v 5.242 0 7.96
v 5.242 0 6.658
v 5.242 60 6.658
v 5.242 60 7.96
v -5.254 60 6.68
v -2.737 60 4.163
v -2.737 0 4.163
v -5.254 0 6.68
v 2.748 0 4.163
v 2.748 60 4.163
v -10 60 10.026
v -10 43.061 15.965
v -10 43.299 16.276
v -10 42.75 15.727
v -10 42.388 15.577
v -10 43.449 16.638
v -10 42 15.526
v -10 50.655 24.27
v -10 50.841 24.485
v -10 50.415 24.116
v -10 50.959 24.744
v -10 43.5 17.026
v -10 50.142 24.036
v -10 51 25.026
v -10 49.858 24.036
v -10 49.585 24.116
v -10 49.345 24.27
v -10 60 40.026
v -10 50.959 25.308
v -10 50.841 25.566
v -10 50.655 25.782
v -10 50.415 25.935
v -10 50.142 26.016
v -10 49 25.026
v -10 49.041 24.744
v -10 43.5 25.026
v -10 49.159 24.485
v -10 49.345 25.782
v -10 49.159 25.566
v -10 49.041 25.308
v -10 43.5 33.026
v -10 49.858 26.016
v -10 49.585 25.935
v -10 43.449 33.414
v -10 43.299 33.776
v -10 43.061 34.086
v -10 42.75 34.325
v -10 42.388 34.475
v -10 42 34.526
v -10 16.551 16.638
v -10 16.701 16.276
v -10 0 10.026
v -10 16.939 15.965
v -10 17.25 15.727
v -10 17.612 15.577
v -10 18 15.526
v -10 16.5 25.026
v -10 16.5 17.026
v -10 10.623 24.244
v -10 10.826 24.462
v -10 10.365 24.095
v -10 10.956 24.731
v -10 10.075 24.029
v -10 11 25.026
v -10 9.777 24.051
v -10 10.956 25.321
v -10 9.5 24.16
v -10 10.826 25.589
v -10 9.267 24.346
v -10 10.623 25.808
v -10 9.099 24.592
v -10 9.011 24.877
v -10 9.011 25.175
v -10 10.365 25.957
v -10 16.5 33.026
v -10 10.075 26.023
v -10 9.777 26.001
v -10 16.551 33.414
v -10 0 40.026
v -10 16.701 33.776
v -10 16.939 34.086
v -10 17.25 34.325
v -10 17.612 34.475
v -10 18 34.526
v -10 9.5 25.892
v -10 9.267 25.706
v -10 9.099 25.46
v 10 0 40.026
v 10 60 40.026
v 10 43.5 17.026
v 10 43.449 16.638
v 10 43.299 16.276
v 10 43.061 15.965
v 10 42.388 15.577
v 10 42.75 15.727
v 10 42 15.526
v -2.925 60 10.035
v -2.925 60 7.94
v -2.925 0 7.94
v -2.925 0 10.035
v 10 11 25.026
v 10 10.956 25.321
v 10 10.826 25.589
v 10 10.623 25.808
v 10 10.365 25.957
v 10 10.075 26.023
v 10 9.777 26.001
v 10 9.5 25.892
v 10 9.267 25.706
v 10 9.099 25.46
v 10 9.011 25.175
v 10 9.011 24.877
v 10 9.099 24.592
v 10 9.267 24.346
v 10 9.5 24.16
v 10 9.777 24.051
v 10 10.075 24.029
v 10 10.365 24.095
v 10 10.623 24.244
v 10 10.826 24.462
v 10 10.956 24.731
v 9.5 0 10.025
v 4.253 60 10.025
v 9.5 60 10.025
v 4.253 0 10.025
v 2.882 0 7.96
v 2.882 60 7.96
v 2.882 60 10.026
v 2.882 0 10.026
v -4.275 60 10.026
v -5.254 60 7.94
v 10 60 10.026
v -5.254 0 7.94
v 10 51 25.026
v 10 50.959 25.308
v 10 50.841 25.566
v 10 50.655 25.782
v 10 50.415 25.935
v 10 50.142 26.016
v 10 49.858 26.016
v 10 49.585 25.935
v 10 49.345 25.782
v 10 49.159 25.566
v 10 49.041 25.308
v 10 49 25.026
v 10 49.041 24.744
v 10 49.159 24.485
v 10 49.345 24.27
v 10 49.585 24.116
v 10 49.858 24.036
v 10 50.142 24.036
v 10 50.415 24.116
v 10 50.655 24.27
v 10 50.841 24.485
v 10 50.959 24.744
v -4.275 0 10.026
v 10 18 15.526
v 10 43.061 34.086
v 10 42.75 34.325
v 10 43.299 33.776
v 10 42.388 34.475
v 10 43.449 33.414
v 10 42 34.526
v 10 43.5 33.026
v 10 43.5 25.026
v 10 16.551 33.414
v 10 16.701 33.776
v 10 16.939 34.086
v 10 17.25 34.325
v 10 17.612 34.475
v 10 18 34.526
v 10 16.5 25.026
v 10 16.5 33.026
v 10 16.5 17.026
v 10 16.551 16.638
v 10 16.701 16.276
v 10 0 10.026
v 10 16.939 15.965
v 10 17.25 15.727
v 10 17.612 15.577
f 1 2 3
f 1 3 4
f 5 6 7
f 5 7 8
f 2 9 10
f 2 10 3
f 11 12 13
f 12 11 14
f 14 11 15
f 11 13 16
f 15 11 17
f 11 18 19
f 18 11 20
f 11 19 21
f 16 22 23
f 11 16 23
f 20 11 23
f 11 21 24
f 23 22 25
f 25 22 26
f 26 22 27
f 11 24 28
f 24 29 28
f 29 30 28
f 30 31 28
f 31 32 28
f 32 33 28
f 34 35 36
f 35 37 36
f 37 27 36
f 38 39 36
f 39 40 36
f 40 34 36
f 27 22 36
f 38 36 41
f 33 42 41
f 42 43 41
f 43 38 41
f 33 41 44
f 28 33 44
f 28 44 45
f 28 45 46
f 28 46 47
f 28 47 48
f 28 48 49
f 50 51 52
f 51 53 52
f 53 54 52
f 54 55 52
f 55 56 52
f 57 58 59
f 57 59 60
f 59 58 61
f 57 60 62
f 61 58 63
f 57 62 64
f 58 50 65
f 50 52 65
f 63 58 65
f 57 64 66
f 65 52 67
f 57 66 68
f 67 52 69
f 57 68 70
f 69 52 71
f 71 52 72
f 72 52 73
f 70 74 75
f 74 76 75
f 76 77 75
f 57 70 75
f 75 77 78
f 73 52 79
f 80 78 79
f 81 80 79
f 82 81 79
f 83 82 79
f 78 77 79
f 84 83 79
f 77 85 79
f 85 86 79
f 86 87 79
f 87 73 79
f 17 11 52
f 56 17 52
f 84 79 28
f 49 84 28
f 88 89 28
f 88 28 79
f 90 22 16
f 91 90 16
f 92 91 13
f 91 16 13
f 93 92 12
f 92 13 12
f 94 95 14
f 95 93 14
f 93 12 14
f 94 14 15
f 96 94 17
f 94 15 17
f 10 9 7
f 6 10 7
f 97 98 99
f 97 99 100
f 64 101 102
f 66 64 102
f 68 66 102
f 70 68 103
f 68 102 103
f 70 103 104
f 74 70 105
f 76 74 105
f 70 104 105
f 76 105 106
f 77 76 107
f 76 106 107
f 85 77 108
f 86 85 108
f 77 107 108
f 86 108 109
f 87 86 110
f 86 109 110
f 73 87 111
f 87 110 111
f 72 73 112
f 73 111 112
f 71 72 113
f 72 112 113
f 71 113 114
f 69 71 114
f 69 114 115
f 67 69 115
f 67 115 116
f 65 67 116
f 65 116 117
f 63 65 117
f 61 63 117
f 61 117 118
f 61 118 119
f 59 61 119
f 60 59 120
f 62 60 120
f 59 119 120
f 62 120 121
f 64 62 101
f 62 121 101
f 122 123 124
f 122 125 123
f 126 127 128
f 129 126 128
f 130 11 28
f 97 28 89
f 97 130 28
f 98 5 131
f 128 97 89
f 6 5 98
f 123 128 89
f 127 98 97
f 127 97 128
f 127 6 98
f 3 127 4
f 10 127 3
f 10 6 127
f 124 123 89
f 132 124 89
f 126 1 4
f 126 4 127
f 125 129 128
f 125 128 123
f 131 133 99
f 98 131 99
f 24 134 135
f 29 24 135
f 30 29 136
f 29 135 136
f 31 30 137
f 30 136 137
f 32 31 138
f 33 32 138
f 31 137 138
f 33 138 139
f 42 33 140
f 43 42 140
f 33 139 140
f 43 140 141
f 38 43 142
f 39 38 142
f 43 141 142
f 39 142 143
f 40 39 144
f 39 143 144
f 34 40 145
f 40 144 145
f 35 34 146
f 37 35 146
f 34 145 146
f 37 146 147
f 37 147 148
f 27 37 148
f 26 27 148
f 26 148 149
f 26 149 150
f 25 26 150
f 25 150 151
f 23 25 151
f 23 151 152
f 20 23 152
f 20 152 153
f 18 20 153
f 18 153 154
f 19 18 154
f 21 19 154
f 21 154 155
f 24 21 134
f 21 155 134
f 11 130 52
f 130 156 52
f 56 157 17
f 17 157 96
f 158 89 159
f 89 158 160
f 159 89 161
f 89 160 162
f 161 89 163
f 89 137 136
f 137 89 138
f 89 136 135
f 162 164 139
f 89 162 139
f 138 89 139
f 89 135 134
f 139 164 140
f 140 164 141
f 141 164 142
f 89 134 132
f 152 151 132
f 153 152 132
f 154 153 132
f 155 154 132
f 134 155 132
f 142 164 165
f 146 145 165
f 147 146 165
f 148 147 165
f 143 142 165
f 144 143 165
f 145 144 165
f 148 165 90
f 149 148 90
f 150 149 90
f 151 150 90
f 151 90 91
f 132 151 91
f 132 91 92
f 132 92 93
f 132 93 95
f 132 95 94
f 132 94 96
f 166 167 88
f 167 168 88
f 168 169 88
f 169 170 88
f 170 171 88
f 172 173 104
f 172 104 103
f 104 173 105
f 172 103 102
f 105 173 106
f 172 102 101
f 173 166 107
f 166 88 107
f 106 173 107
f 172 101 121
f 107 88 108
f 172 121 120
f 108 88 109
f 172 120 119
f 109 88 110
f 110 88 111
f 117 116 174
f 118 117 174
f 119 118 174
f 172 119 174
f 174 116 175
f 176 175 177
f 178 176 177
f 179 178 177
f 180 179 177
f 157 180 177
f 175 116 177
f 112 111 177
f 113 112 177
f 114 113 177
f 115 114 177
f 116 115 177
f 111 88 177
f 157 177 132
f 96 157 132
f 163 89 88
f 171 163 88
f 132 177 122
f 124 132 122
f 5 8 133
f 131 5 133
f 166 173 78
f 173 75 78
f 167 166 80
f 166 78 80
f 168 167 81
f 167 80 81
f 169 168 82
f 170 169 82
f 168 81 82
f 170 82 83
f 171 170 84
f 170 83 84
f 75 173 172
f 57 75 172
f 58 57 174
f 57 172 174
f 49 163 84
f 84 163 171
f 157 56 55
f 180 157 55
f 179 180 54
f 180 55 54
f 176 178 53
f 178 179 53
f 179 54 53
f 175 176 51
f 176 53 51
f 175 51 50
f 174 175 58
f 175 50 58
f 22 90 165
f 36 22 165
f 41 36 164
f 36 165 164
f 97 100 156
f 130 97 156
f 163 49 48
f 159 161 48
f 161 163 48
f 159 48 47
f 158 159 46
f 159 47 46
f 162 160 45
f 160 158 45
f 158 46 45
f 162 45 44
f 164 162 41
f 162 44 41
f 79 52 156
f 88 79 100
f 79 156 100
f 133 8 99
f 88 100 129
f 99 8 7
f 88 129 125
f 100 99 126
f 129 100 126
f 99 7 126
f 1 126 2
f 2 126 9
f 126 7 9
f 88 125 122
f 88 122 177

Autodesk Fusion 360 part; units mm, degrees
sketch "Sketch1" plane through (0, 0, 0) normal (0, 1, 0) x (1, 0, 0)
  line L0 (2.8825, -8.6547) -> (4.3945, -10.1667)
  line L1 (3.9, -0.21) -> (3.9, -2.8393)
  line L2 (-8.2, 5.5) -> (-8.2, 3.125)
  line L3 (-2.925, -8.676) -> (-4.4001, -10.1511)
  arc A0 (9.4998, -10.0253) -> (10.0042, -9.4999) centre (9.4925, -9.5135) ccw
  line L4 (0, -4.0611) -> (-0.1019, -4.163)
  line L5 (5.5, 8.2) -> (3.125, 8.2)
  line L6 (-6.5607, -5.5) -> (-8.2, -5.5)
  line L7 (5.2425, -6.658) -> (5.2425, -7.96)
  line L8 (-8.2, -5.5) -> (-8.2, -3.1249)
  line L9 (0, -4.0611) -> (0.1019, -4.163)
  line L10 (-2.7368, -4.163) -> (-5.2537, -6.6799)
  line L11 (-3.125, 8.545) -> (-4.58, 10)
  line L12 (6.5607, 5.5) -> (8.2, 5.5)
  line L13 (-3.125, 8.2) -> (-3.125, 8.545)
  arc A1 (-9.5, 10) -> (-10, 9.5) centre (-9.5, 9.5) ccw
  line L14 (8.2, 3.125) -> (8.545, 3.125)
  line L15 (-3.9, 0.21) -> (-3.9, 2.8393)
  line L16 (-10, 9.5) -> (-10, 4.58)
  line L17 (0.1019, -4.163) -> (2.7475, -4.163)
  line L18 (-3.125, -8.14) -> (-3.125, -8.5931)
  line L19 (-6.5607, 5.5) -> (-8.2, 5.5)
  line L20 (-5.2537, -7.94) -> (-2.925, -7.94)
  line L21 (3.69, 0) -> (3.9, -0.21)
  line L22 (-10.0013, -4.5807) -> (-10.0013, -9.5)
  line L23 (-0.1019, -4.163) -> (-2.7368, -4.163)
  line L24 (-3.69, 0) -> (-3.9, -0.21)
  line L25 (3.9, -2.8393) -> (6.5607, -5.5)
  line L26 (-5.4537, -6.5971) -> (-5.4537, -8.14)
  arc A2 (10, 9.5) -> (9.5, 10) centre (9.5, 9.5) ccw
  line L27 (-3.9, 2.8393) -> (-6.5607, 5.5)
  line L28 (8.545, 3.125) -> (10, 4.58)
  line L29 (10.0042, -4.5823) -> (10.0042, -9.4999)
  line L30 (-5.4537, -8.14) -> (-3.125, -8.14)
  line L31 (-10, -10.0258) -> (-10, -15)
  line L32 (-3.125, -8.5931) -> (-4.5415, -10.0097)
  line L33 (-3.9, -2.8393) -> (-6.5607, -5.5)
  line L34 (3.0825, -8.5719) -> (4.5359, -10.0253)
  line L35 (5.4425, -8.16) -> (3.0825, -8.16)
  line L36 (-2.925, -7.94) -> (-2.925, -8.676)
  line L37 (3.125, 8.2) -> (3.125, 8.545)
  line L38 (8.2, -3.1245) -> (8.5464, -3.1245)
  line L39 (8.2, -5.5) -> (8.2, -3.1245)
  line L40 (0, -3.7782) -> (0.1847, -3.963)
  line L41 (0, -3.7782) -> (-0.1847, -3.963)
  line L42 (0.1847, -3.963) -> (2.8304, -3.963)
  line L43 (-9.5, -10.0097) -> (-4.5415, -10.0097)
  line L44 (4.5359, -10.0253) -> (9.4998, -10.0253)
  line L45 (6.5607, -5.5) -> (8.2, -5.5)
  line L46 (-2.8196, -3.963) -> (-5.4537, -6.5971)
  line L47 (-8.2, -3.1249) -> (-8.5454, -3.1249)
  line L48 (8.5464, -3.1245) -> (10.0042, -4.5823)
  arc A3 (-10.0013, -9.5) -> (-9.5, -10.0097) centre (-9.4969, -9.5053) ccw
  line L49 (10, -15) -> (10, -10.0258)
  line L50 (-5.2537, -6.6799) -> (-5.2537, -7.94)
  line L51 (5.2425, -7.96) -> (2.8825, -7.96)
  line L52 (3.0825, -8.16) -> (3.0825, -8.5719)
  line L53 (5.4425, -6.5751) -> (5.4425, -8.16)
  line L54 (3.9, 0.21) -> (3.9, 2.8393)
  line L55 (-3.9, -0.21) -> (-3.9, -2.8393)
  line L56 (3.9, 2.8393) -> (6.5607, 5.5)
  line L57 (-5.5, 6.5607) -> (-5.5, 8.2)
  line L58 (2.8825, -7.96) -> (2.8825, -8.6547)
  line L59 (-8.5454, -3.1249) -> (-10.0013, -4.5807)
  line L60 (0, 3.69) -> (-0.21, 3.9)
  line L61 (2.8304, -3.963) -> (5.4425, -6.5751)
  line L62 (2.7475, -4.163) -> (5.2425, -6.658)
  line L63 (-8.545, 3.125) -> (-10, 4.58)
  line L64 (-0.1847, -3.963) -> (-2.8196, -3.963)
  line L65 (5.5, 6.5607) -> (5.5, 8.2)
  line L66 (-0.21, 3.9) -> (-2.8393, 3.9)
  line L67 (3.69, 0) -> (3.9, 0.21)
  line L68 (-5.5, 8.2) -> (-3.125, 8.2)
  line L69 (-8.2, 3.125) -> (-8.545, 3.125)
  line L70 (-2.8393, 3.9) -> (-5.5, 6.5607)
  line L71 (2.8393, 3.9) -> (5.5, 6.5607)
  line L72 (10, 9.5) -> (10, 4.58)
  line L73 (8.2, 5.5) -> (8.2, 3.125)
  line L74 (-3.69, 0) -> (-3.9, 0.21)
  line L75 (0.21, 3.9) -> (2.8393, 3.9)
  line L76 (4.58, 10) -> (9.5, 10)
  circle A4 centre (0, 0) radius 2.5
  line L77 (3.125, 8.545) -> (4.58, 10)
  line L78 (-9.5, 10) -> (-4.58, 10)
  line L79 (0, 3.69) -> (0.21, 3.9)
  line L80 (-10, -15) -> (10, -15)
  line L81 (0.1019, -4.163) -> (-0.1019, -4.163)
  line L82 (4.2531, -10.0253) -> (4.5359, -10.0253)
  line L83 (10, -10.0258) -> (4.2536, -10.0258)
  line L84 (-4.2748, -10.0258) -> (-10, -10.0258)
  line L85 (2.8825, -8.6547) -> (2.8825, -10.0258)
  line L86 (2.8825, -10.0258) -> (4.2536, -10.0258)
  line L87 (-2.925, -8.676) -> (-2.925, -10.0353)
  line L88 (-2.925, -10.0353) -> (-4.2748, -10.0258)
  point P0 (0, -10)
  dimension "d1" = 0.2
  dimension "d2" = 5
extrude "Extrude1" add sketch "Sketch1" along normal blind 60 contours L7 L10 L17 L20 L23 L31 L36 L44 L49 L50 L51 L58 L62 L80 L81 L82 L83 L84 L85 L86 L87 L88
sketch "Sketch2" plane through (10, 0, 0) normal (1, 0, 0) x (0, 1, 0)
  line L0 (0, 15) -> (0, 10.0258)
  line L1 (0, 10.0258) -> (60, 10.0258)
  line L2 (60, 10.0258) -> (60, 15)
  line L3 (60, 15) -> (0, 15)
  line L4 (0, 10.0258) -> (60, 10.0258)
  line L5 (60, 10.0258) -> (60, 40.0258)
  line L6 (60, 40.0258) -> (0, 40.0258)
  line L7 (0, 40.0258) -> (0, 10.0258)
  line L8 (60, 40.0258) -> (0, 10.0258) construction
  line L9 (0, 40.0258) -> (60, 10.0258) construction
  line L10 (43.5, 34.5258) -> (16.5, 34.5258)
  line L11 (16.5, 34.5258) -> (16.5, 15.5258)
  line L12 (16.5, 15.5258) -> (43.5, 15.5258)
  line L13 (43.5, 15.5258) -> (43.5, 34.5258)
  line L14 (43.5, 34.5258) -> (16.5, 15.5258) construction
  line L15 (16.5, 34.5258) -> (43.5, 15.5258) construction
  line L16 (16.5, 25.0258) -> (10, 25.0258)
  line L17 (43.5, 25.0258) -> (50, 25.0258)
  circle A0 centre (10, 25.0258) radius 1
  circle A1 centre (50, 25.0258) radius 1
  point P0 (30, 25.0258)
  dimension "d5" = 30
  dimension "d6" = 60
  dimension "d7" = 27
  dimension "d8" = 19
  dimension "d9" = 6.5
  dimension "d10" = 6.5
  dimension "d11" = 2
  dimension "d12" = 2
extrude "Extrude2" add sketch "Sketch2" against normal blind 20 contours L3 L5 L6 L7
fillet "Fillet1" radius 1.5 4 edges at (0, 43.5, 15.5258) (0, 16.5, 15.5258) (0, 43.5, 34.5258) (0, 16.5, 34.5258)
